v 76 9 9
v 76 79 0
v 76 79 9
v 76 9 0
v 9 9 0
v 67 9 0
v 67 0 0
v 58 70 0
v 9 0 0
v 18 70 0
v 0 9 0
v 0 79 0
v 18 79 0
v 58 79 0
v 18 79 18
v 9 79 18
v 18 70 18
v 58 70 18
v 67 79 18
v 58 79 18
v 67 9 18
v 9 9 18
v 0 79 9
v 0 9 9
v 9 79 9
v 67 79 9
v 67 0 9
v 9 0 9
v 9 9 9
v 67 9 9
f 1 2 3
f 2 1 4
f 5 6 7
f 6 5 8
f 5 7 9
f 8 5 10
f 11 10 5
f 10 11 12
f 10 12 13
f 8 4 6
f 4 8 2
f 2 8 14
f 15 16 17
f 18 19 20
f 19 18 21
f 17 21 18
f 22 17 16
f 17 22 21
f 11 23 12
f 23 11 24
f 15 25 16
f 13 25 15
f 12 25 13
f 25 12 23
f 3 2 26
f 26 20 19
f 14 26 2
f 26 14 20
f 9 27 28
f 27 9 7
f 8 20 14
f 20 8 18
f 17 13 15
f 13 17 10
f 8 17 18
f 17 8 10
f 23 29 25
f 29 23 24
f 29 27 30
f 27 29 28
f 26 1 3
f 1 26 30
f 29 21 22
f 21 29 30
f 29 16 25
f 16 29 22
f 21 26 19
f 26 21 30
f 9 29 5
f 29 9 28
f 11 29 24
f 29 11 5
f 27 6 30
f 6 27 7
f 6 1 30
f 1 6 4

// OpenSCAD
use <../minitub.scad>;

mirror([0, 0, 180]) translate([0, 0, -18])
    panel_front_inner();
